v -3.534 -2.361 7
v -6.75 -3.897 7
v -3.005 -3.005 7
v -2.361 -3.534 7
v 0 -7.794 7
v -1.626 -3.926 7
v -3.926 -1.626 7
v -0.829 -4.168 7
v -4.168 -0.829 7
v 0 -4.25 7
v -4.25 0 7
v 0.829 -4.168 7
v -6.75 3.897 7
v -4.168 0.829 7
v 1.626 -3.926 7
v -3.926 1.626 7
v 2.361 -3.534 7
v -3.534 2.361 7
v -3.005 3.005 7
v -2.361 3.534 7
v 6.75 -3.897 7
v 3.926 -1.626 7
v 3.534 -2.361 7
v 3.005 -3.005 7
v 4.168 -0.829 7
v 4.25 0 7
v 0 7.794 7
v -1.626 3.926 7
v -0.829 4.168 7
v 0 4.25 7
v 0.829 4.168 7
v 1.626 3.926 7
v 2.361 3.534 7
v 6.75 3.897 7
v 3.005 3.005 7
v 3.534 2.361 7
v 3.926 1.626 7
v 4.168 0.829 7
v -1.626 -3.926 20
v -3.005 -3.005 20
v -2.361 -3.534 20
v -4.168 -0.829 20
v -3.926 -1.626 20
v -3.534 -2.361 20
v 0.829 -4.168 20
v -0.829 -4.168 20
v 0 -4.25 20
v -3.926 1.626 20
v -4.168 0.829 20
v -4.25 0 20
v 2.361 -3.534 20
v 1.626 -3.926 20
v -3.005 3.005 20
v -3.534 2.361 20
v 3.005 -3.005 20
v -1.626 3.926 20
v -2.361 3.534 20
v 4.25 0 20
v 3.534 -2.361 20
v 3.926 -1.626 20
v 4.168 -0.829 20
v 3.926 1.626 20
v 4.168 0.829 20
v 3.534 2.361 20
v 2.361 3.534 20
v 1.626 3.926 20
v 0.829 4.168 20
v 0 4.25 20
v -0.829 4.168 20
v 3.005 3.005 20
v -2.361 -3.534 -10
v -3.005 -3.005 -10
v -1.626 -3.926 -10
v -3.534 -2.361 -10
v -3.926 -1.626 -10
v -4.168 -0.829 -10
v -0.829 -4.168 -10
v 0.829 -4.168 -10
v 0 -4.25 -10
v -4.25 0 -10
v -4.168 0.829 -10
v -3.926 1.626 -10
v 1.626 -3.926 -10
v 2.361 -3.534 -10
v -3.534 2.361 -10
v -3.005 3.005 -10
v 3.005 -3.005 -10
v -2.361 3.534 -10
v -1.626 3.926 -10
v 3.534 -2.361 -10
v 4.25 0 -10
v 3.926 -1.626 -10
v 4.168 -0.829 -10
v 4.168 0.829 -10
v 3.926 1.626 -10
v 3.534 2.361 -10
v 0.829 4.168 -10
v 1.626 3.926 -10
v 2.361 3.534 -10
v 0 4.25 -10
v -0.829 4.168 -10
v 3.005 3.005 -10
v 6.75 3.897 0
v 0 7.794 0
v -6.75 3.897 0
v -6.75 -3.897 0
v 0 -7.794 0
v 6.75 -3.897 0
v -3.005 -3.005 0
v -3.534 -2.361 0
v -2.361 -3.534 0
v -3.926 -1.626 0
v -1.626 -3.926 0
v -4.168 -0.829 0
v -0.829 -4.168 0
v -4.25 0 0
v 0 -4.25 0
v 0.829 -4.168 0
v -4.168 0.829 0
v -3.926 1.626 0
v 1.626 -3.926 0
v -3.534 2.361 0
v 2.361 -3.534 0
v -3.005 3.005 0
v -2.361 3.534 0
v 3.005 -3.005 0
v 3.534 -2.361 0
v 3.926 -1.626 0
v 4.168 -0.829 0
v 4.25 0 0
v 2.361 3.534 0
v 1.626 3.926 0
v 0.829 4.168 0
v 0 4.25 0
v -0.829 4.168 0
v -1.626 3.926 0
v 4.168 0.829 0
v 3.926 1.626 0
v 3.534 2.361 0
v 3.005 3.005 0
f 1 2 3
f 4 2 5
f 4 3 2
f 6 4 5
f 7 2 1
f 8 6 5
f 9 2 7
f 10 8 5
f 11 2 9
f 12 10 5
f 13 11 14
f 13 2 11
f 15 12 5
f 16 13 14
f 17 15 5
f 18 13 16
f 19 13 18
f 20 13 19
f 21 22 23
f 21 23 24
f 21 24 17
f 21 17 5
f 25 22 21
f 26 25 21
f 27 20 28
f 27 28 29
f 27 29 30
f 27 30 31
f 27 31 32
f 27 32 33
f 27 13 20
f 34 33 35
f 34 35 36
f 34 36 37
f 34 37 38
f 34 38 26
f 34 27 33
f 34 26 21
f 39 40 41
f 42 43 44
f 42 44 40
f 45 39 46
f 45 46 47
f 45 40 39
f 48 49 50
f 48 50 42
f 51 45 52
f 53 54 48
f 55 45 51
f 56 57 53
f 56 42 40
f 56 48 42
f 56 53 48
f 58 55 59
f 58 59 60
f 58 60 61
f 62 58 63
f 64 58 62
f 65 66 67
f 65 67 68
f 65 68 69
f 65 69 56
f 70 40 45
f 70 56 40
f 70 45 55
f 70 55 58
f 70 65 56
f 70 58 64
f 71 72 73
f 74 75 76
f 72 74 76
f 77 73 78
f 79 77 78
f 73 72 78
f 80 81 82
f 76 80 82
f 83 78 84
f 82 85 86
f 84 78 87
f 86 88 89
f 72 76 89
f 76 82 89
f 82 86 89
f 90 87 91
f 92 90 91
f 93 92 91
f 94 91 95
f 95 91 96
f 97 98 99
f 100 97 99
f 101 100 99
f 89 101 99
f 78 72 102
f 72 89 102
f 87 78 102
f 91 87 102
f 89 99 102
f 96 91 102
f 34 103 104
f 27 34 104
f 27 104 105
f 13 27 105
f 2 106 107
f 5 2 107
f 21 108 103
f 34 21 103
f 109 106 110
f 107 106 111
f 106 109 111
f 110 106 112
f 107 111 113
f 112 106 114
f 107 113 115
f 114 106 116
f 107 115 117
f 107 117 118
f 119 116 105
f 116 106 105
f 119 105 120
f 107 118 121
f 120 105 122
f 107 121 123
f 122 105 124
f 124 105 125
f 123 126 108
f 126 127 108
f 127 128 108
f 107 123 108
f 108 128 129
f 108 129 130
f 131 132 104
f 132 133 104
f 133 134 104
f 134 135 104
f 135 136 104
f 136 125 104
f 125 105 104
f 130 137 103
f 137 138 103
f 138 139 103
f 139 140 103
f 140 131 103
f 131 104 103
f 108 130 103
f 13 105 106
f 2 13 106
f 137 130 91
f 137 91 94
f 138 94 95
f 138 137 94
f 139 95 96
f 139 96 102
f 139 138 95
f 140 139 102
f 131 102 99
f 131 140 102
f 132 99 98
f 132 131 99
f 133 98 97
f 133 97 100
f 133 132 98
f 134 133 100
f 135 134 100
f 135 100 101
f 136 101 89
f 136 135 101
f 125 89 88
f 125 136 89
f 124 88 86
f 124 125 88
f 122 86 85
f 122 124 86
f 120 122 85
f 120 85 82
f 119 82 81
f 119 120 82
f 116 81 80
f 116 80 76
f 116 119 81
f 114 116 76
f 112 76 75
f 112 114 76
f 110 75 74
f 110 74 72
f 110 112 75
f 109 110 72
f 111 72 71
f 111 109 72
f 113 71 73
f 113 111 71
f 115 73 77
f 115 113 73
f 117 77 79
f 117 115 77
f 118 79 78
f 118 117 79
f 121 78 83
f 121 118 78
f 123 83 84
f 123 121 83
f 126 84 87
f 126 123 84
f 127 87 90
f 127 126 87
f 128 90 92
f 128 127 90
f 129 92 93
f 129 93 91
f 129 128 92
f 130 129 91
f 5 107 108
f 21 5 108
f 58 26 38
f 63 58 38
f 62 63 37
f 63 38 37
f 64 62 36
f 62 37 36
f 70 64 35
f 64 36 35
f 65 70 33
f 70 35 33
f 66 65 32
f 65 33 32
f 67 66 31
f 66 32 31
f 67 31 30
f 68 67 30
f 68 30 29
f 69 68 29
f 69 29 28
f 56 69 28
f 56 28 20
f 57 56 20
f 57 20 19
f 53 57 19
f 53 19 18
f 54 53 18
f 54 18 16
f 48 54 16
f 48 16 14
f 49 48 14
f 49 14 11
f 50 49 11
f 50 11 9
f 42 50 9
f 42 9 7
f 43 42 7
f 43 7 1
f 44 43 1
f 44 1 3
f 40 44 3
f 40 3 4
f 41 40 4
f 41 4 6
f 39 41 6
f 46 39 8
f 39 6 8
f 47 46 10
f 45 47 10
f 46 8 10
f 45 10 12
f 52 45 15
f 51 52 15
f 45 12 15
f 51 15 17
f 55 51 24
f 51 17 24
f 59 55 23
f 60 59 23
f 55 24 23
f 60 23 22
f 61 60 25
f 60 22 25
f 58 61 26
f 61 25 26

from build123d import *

# Parameters (mm, degrees)
PAD_DEPTH         = 7
SKETCH001_R       = 4.25
PAD001_DEPTH      = 20
PAD001_DEPTH_BACK = 10


with BuildPart() as part:
    # Sketch → Pad (new body)
    with BuildSketch(Plane.XY):
        Polygon((0, -7.794229), (6.75, -3.897114), (6.75, 3.897114), (0, 7.794229), (-6.75, 3.897114), (-6.75, -3.897114), align=None)
    extrude(amount=PAD_DEPTH)

    # Sketch001 → Pad001 (join, two sides)
    with BuildSketch(Plane.XY) as pad001_sk:
        Circle(SKETCH001_R)
    extrude(amount=PAD001_DEPTH)
    extrude(pad001_sk.sketch, amount=-PAD001_DEPTH_BACK)


solid = part.part
